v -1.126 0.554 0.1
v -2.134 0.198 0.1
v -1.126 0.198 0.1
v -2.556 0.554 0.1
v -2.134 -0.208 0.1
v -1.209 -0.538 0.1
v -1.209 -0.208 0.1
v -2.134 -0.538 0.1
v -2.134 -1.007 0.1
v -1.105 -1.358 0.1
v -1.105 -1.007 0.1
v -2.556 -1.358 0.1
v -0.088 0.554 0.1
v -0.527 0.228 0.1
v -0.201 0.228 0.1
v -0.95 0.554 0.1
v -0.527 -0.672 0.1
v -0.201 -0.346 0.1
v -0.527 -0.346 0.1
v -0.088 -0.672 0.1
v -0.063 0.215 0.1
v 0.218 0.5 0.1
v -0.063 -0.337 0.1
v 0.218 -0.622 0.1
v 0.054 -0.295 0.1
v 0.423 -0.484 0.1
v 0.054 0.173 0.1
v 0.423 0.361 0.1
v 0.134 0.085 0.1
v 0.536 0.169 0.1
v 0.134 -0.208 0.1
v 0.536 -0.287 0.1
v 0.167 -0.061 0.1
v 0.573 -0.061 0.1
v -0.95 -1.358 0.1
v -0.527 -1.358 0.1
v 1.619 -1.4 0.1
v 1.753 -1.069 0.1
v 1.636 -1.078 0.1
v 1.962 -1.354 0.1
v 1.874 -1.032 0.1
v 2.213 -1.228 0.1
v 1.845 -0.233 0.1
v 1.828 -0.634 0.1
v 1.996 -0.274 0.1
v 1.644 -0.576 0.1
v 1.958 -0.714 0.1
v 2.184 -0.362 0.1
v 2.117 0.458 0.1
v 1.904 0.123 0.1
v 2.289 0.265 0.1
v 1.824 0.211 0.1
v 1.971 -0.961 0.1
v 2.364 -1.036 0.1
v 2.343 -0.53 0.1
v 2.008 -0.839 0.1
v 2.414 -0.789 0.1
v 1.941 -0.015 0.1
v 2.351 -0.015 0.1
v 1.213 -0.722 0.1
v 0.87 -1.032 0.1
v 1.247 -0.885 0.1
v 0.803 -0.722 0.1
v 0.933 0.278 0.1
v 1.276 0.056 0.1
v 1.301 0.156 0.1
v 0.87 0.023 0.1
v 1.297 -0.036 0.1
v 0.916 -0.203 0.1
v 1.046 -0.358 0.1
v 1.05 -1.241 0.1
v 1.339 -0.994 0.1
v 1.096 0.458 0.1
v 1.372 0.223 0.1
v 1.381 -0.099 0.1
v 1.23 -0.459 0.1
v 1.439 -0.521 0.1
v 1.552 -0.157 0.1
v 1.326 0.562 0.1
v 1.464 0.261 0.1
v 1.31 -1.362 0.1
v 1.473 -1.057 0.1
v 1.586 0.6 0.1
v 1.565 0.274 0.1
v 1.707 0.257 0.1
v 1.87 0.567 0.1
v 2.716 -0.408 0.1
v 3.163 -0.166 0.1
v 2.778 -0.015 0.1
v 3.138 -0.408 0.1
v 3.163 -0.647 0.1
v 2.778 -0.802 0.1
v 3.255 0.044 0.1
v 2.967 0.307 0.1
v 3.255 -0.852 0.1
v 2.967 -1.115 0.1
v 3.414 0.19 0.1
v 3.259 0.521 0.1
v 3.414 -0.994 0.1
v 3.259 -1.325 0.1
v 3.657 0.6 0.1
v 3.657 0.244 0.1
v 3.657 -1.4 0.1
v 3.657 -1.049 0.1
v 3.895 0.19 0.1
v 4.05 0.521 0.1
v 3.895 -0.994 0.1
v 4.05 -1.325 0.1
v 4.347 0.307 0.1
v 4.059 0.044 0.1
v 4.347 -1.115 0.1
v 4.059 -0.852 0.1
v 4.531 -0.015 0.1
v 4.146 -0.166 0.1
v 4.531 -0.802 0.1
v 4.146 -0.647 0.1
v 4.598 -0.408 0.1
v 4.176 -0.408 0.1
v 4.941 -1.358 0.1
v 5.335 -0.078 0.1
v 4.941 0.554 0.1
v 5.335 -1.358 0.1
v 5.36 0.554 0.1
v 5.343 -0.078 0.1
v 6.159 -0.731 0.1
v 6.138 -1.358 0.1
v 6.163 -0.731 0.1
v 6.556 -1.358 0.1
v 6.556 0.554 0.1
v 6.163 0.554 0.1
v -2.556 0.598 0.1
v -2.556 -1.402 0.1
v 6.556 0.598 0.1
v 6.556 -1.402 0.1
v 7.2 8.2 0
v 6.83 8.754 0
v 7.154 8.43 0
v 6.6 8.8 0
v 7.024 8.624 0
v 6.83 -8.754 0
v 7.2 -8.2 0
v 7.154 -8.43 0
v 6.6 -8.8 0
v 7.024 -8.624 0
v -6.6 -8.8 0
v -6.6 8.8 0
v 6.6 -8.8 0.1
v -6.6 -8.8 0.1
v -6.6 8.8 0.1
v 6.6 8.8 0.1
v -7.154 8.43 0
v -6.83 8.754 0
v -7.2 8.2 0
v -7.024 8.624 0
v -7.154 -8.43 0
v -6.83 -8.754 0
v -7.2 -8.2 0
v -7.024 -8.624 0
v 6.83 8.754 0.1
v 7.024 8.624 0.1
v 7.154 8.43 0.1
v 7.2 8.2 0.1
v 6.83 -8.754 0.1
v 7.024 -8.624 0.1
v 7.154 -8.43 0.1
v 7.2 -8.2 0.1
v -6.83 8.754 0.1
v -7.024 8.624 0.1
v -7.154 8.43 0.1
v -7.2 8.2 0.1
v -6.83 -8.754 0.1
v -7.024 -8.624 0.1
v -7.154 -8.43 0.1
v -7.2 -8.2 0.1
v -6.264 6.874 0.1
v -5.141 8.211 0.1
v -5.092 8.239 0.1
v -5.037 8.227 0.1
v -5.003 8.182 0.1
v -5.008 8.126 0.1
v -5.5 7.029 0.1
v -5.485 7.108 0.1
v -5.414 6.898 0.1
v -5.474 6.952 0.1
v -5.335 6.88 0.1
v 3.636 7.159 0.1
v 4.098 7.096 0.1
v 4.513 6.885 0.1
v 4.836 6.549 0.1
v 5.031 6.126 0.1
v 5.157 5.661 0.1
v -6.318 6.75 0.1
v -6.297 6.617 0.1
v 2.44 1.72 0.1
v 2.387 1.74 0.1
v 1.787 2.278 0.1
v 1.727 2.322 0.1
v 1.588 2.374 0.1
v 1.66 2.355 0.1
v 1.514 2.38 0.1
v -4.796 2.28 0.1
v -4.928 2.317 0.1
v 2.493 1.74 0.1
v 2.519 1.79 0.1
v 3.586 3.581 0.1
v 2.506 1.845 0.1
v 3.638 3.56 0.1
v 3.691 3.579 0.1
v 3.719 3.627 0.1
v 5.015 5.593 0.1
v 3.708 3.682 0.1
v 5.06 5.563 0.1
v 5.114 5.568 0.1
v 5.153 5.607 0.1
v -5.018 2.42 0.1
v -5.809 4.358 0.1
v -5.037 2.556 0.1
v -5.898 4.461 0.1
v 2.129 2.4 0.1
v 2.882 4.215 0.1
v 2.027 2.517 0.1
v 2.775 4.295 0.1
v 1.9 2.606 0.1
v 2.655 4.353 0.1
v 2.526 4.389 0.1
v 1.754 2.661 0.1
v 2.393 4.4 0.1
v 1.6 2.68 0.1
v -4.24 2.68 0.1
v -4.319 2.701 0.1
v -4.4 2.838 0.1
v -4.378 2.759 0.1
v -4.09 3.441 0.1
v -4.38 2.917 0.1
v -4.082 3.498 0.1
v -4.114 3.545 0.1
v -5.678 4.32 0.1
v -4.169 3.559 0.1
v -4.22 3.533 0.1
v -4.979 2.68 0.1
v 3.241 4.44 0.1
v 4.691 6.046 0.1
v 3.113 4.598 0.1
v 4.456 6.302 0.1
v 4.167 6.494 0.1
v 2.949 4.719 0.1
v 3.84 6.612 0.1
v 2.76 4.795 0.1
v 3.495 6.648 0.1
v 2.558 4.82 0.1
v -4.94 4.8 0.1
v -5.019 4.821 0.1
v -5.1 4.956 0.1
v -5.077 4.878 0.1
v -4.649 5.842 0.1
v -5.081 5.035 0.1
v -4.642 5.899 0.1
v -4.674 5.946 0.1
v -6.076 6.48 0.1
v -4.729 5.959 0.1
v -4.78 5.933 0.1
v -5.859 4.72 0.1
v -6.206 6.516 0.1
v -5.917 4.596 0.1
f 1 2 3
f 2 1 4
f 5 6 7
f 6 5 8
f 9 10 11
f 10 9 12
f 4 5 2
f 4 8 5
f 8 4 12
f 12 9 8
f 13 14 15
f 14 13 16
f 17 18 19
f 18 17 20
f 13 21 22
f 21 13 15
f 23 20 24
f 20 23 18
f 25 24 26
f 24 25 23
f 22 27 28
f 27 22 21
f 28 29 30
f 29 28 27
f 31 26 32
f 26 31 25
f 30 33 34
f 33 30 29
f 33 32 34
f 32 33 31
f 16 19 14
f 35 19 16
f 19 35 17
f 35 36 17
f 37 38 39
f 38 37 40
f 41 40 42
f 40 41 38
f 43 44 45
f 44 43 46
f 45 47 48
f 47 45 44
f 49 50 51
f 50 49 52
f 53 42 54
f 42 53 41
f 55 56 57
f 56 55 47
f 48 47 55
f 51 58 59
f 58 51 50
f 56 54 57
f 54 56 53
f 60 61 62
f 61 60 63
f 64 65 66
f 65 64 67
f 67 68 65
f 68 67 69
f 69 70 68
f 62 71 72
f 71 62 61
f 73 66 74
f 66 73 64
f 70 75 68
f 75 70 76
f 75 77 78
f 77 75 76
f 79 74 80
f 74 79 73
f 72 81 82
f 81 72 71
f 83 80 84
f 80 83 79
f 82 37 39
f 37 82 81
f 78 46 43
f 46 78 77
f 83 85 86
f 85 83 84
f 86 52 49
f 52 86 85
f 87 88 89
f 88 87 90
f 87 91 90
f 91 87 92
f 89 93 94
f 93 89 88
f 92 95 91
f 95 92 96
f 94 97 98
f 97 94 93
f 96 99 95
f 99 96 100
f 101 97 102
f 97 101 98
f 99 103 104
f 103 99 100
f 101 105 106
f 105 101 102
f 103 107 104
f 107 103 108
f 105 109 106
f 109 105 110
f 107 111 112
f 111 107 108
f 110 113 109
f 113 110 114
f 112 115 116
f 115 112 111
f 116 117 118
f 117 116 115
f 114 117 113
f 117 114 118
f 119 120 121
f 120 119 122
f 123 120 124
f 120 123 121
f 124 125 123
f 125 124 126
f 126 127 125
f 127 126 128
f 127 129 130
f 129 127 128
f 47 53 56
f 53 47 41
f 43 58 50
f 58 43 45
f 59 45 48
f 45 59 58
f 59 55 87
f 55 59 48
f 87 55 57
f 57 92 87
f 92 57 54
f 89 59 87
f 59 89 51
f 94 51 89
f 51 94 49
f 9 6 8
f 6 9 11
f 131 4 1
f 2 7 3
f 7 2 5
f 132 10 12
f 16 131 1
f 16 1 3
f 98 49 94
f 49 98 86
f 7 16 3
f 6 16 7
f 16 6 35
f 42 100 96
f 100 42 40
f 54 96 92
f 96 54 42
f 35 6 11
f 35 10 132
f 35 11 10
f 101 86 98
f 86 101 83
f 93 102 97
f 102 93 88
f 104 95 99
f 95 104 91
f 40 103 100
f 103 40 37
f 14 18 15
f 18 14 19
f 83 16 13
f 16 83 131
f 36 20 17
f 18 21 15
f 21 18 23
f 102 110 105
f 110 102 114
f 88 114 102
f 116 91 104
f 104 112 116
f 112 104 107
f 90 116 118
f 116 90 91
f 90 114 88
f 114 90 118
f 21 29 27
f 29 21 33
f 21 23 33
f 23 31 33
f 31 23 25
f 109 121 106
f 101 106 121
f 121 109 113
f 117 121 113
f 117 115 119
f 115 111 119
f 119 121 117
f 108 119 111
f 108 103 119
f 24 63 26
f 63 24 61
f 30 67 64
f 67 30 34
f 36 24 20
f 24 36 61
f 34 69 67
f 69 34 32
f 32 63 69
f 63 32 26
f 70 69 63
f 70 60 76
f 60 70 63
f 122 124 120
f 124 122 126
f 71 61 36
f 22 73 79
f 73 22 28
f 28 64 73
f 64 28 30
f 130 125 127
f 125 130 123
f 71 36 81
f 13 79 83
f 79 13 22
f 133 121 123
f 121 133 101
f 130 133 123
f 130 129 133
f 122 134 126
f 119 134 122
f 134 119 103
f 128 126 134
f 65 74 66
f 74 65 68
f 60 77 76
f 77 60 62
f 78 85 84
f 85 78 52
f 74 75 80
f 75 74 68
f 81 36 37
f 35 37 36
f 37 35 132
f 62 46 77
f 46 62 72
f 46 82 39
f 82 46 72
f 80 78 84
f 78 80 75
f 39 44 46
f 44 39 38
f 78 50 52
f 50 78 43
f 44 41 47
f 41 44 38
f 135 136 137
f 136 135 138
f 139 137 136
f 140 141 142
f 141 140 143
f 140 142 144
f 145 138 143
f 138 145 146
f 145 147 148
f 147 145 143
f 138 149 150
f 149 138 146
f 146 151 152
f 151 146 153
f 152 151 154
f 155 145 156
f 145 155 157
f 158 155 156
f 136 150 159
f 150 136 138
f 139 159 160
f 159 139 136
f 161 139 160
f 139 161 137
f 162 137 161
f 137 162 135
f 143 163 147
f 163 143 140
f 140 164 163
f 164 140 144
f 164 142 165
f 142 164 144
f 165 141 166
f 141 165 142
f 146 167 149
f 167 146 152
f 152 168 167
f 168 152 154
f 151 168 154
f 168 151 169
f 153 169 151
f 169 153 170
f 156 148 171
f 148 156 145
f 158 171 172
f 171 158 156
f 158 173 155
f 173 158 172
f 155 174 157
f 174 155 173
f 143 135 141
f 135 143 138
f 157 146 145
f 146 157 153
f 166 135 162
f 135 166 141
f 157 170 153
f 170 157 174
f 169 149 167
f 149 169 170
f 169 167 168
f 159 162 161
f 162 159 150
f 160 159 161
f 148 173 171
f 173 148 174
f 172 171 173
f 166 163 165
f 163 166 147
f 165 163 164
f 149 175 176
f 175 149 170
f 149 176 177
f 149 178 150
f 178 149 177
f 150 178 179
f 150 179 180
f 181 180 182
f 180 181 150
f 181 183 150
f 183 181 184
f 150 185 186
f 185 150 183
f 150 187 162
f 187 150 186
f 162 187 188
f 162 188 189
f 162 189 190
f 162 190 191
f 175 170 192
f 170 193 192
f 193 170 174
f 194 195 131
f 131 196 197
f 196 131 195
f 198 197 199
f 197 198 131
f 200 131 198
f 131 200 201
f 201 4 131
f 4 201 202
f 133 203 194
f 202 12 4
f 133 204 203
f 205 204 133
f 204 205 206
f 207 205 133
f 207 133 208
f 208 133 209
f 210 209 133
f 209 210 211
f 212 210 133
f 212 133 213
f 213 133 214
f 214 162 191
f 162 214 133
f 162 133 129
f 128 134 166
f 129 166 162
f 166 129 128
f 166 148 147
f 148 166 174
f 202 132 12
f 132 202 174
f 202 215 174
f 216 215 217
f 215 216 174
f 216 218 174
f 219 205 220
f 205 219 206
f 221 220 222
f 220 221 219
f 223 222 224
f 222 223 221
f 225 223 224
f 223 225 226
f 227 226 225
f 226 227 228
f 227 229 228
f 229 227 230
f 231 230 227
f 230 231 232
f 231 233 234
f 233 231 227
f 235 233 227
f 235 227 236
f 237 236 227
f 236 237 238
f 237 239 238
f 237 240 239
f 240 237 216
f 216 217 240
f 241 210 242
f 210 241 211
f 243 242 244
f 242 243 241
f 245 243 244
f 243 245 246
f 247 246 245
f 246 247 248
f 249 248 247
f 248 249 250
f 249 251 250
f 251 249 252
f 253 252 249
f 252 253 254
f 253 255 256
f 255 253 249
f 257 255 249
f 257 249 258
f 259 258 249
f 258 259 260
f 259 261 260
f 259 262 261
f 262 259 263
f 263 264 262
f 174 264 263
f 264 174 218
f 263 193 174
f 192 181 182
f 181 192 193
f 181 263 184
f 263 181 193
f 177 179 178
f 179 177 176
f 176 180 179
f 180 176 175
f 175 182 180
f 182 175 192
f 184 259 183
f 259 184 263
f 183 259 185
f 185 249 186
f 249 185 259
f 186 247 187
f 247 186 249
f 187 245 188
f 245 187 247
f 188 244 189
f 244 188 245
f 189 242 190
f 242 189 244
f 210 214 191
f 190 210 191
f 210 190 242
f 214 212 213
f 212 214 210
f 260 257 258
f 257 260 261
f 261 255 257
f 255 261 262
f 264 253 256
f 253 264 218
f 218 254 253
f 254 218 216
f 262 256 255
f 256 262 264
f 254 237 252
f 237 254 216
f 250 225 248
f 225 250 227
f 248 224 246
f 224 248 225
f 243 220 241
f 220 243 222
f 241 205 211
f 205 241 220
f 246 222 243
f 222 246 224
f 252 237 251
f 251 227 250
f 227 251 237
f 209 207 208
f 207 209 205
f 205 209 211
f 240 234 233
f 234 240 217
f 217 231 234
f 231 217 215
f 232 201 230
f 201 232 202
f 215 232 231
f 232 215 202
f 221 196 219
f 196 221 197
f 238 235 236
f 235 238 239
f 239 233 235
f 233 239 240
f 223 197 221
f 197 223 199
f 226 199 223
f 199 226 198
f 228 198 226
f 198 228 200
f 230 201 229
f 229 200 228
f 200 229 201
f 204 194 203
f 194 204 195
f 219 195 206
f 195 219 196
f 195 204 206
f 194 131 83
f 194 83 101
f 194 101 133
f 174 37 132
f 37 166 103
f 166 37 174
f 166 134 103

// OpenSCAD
use <../lib.scad>
use <../p/logo-epson-text-box.scad>
use <../p/logo-epson-text.scad>
use <s/6177973as01.scad>
function ldraw_lib__6177973a() = [
// 0 Sticker  2.2 x  1.8 with White "EPSON" and 3 Grey Stripes on Black Background Right
// 0 Name: 6177973a.dat
// 0 Author: Massimo Maso [Sirio]
// 0 !LDRAW_ORG Part UPDATE 2026-07
// 0 !LICENSE Licensed under CC BY 4.0 : see CAreadme.txt
// 
// 0 BFC CERTIFY CCW
  [0,"BFC","CERTIFY"],
  [0,"BFC","CCW"],
// 
// 0 !CATEGORY Sticker
// 0 !KEYWORDS 2016, 44, 6, AMG, BrickLink 75883stk01, Brickowl 129746, F1
// 0 !KEYWORDS Formula one, Hybrid, Lewis Hamilton, Mercedes, Nico Rosberg
// 0 !KEYWORDS Petronas, Rebrickable 30901, Set 75883, Set 75995, Speed Champions
// 0 !KEYWORDS Team, Toto Wolff, W07
// 
// 0 !HISTORY 2026-07-30 [OrionP] Official Update 2026-07
// 
// 0 // Logo primitives
// 1 15 5 -.25 -1 .5 0 0 0 1 0 0 0 .5 logo-epson-text.dat
  [1,15,5,-.25,-1,.5,0,0,0,1,0,0,0,.5, ldraw_lib__logo_epson_text()],
// 1 0 5 -.25 -1 .5 0 0 0 1 0 0 0 .5 logo-epson-text-box.dat
  [1,0,5,-.25,-1,.5,0,0,0,1,0,0,0,.5, ldraw_lib__logo_epson_text_box()],
// 0 // Subparts
// 1 16 0 0 0 1 0 0 0 1 0 0 0 1 s\6177973as01.dat
  [1,16,0,0,0,1,0,0,0,1,0,0,0,1, ldraw_lib__s__6177973as01()],
// 0 // Top face
// 0 // Complementary faces
// 3 0 6.0988 -.25 4.3 -6.39125 -.25 1.49475 3.9644 -.25 1.5
  [3,0,6.0988,-.25,4.3,-6.39125,-.25,1.49475,3.9644,-.25,1.5],
// 3 0 6.0988 -.25 4.3 3.9644 -.25 1.5 9.1423 -.25 1.5
  [3,0,6.0988,-.25,4.3,3.9644,-.25,1.5,9.1423,-.25,1.5],
// 3 0 6.0988 -.25 4.3 9.1423 -.25 1.5 16.39125 -.25 1.49475
  [3,0,6.0988,-.25,4.3,9.1423,-.25,1.5,16.39125,-.25,1.49475],
// 3 0 -18 -.25 -20.5 4.0481 -.25 -3.5 -6.39125 -.25 -3.50525
  [3,0,-18,-.25,-20.5,4.0481,-.25,-3.5,-6.39125,-.25,-3.50525],
// 4 0 -18 -.25 -20.5 18 -.25 -20.5 9.1423 -.25 -3.5 4.0481 -.25 -3.5
  [4,0,-18,-.25,-20.5,18,-.25,-20.5,9.1423,-.25,-3.5,4.0481,-.25,-3.5],
// 3 0 18 -.25 -20.5 16.39125 -.25 -3.50525 9.1423 -.25 -3.5
  [3,0,18,-.25,-20.5,16.39125,-.25,-3.50525,9.1423,-.25,-3.5],
];
module ldraw_lib__6177973a(step=0, col=false, unit=2/5, alt=false, line=0.2, solid=!$preview)
    makepoly(ldraw_lib__6177973a(), step=step, col=col, unit=unit, alt=alt, line=line, solid=solid);
ldraw_lib__6177973a(line=0.2);
